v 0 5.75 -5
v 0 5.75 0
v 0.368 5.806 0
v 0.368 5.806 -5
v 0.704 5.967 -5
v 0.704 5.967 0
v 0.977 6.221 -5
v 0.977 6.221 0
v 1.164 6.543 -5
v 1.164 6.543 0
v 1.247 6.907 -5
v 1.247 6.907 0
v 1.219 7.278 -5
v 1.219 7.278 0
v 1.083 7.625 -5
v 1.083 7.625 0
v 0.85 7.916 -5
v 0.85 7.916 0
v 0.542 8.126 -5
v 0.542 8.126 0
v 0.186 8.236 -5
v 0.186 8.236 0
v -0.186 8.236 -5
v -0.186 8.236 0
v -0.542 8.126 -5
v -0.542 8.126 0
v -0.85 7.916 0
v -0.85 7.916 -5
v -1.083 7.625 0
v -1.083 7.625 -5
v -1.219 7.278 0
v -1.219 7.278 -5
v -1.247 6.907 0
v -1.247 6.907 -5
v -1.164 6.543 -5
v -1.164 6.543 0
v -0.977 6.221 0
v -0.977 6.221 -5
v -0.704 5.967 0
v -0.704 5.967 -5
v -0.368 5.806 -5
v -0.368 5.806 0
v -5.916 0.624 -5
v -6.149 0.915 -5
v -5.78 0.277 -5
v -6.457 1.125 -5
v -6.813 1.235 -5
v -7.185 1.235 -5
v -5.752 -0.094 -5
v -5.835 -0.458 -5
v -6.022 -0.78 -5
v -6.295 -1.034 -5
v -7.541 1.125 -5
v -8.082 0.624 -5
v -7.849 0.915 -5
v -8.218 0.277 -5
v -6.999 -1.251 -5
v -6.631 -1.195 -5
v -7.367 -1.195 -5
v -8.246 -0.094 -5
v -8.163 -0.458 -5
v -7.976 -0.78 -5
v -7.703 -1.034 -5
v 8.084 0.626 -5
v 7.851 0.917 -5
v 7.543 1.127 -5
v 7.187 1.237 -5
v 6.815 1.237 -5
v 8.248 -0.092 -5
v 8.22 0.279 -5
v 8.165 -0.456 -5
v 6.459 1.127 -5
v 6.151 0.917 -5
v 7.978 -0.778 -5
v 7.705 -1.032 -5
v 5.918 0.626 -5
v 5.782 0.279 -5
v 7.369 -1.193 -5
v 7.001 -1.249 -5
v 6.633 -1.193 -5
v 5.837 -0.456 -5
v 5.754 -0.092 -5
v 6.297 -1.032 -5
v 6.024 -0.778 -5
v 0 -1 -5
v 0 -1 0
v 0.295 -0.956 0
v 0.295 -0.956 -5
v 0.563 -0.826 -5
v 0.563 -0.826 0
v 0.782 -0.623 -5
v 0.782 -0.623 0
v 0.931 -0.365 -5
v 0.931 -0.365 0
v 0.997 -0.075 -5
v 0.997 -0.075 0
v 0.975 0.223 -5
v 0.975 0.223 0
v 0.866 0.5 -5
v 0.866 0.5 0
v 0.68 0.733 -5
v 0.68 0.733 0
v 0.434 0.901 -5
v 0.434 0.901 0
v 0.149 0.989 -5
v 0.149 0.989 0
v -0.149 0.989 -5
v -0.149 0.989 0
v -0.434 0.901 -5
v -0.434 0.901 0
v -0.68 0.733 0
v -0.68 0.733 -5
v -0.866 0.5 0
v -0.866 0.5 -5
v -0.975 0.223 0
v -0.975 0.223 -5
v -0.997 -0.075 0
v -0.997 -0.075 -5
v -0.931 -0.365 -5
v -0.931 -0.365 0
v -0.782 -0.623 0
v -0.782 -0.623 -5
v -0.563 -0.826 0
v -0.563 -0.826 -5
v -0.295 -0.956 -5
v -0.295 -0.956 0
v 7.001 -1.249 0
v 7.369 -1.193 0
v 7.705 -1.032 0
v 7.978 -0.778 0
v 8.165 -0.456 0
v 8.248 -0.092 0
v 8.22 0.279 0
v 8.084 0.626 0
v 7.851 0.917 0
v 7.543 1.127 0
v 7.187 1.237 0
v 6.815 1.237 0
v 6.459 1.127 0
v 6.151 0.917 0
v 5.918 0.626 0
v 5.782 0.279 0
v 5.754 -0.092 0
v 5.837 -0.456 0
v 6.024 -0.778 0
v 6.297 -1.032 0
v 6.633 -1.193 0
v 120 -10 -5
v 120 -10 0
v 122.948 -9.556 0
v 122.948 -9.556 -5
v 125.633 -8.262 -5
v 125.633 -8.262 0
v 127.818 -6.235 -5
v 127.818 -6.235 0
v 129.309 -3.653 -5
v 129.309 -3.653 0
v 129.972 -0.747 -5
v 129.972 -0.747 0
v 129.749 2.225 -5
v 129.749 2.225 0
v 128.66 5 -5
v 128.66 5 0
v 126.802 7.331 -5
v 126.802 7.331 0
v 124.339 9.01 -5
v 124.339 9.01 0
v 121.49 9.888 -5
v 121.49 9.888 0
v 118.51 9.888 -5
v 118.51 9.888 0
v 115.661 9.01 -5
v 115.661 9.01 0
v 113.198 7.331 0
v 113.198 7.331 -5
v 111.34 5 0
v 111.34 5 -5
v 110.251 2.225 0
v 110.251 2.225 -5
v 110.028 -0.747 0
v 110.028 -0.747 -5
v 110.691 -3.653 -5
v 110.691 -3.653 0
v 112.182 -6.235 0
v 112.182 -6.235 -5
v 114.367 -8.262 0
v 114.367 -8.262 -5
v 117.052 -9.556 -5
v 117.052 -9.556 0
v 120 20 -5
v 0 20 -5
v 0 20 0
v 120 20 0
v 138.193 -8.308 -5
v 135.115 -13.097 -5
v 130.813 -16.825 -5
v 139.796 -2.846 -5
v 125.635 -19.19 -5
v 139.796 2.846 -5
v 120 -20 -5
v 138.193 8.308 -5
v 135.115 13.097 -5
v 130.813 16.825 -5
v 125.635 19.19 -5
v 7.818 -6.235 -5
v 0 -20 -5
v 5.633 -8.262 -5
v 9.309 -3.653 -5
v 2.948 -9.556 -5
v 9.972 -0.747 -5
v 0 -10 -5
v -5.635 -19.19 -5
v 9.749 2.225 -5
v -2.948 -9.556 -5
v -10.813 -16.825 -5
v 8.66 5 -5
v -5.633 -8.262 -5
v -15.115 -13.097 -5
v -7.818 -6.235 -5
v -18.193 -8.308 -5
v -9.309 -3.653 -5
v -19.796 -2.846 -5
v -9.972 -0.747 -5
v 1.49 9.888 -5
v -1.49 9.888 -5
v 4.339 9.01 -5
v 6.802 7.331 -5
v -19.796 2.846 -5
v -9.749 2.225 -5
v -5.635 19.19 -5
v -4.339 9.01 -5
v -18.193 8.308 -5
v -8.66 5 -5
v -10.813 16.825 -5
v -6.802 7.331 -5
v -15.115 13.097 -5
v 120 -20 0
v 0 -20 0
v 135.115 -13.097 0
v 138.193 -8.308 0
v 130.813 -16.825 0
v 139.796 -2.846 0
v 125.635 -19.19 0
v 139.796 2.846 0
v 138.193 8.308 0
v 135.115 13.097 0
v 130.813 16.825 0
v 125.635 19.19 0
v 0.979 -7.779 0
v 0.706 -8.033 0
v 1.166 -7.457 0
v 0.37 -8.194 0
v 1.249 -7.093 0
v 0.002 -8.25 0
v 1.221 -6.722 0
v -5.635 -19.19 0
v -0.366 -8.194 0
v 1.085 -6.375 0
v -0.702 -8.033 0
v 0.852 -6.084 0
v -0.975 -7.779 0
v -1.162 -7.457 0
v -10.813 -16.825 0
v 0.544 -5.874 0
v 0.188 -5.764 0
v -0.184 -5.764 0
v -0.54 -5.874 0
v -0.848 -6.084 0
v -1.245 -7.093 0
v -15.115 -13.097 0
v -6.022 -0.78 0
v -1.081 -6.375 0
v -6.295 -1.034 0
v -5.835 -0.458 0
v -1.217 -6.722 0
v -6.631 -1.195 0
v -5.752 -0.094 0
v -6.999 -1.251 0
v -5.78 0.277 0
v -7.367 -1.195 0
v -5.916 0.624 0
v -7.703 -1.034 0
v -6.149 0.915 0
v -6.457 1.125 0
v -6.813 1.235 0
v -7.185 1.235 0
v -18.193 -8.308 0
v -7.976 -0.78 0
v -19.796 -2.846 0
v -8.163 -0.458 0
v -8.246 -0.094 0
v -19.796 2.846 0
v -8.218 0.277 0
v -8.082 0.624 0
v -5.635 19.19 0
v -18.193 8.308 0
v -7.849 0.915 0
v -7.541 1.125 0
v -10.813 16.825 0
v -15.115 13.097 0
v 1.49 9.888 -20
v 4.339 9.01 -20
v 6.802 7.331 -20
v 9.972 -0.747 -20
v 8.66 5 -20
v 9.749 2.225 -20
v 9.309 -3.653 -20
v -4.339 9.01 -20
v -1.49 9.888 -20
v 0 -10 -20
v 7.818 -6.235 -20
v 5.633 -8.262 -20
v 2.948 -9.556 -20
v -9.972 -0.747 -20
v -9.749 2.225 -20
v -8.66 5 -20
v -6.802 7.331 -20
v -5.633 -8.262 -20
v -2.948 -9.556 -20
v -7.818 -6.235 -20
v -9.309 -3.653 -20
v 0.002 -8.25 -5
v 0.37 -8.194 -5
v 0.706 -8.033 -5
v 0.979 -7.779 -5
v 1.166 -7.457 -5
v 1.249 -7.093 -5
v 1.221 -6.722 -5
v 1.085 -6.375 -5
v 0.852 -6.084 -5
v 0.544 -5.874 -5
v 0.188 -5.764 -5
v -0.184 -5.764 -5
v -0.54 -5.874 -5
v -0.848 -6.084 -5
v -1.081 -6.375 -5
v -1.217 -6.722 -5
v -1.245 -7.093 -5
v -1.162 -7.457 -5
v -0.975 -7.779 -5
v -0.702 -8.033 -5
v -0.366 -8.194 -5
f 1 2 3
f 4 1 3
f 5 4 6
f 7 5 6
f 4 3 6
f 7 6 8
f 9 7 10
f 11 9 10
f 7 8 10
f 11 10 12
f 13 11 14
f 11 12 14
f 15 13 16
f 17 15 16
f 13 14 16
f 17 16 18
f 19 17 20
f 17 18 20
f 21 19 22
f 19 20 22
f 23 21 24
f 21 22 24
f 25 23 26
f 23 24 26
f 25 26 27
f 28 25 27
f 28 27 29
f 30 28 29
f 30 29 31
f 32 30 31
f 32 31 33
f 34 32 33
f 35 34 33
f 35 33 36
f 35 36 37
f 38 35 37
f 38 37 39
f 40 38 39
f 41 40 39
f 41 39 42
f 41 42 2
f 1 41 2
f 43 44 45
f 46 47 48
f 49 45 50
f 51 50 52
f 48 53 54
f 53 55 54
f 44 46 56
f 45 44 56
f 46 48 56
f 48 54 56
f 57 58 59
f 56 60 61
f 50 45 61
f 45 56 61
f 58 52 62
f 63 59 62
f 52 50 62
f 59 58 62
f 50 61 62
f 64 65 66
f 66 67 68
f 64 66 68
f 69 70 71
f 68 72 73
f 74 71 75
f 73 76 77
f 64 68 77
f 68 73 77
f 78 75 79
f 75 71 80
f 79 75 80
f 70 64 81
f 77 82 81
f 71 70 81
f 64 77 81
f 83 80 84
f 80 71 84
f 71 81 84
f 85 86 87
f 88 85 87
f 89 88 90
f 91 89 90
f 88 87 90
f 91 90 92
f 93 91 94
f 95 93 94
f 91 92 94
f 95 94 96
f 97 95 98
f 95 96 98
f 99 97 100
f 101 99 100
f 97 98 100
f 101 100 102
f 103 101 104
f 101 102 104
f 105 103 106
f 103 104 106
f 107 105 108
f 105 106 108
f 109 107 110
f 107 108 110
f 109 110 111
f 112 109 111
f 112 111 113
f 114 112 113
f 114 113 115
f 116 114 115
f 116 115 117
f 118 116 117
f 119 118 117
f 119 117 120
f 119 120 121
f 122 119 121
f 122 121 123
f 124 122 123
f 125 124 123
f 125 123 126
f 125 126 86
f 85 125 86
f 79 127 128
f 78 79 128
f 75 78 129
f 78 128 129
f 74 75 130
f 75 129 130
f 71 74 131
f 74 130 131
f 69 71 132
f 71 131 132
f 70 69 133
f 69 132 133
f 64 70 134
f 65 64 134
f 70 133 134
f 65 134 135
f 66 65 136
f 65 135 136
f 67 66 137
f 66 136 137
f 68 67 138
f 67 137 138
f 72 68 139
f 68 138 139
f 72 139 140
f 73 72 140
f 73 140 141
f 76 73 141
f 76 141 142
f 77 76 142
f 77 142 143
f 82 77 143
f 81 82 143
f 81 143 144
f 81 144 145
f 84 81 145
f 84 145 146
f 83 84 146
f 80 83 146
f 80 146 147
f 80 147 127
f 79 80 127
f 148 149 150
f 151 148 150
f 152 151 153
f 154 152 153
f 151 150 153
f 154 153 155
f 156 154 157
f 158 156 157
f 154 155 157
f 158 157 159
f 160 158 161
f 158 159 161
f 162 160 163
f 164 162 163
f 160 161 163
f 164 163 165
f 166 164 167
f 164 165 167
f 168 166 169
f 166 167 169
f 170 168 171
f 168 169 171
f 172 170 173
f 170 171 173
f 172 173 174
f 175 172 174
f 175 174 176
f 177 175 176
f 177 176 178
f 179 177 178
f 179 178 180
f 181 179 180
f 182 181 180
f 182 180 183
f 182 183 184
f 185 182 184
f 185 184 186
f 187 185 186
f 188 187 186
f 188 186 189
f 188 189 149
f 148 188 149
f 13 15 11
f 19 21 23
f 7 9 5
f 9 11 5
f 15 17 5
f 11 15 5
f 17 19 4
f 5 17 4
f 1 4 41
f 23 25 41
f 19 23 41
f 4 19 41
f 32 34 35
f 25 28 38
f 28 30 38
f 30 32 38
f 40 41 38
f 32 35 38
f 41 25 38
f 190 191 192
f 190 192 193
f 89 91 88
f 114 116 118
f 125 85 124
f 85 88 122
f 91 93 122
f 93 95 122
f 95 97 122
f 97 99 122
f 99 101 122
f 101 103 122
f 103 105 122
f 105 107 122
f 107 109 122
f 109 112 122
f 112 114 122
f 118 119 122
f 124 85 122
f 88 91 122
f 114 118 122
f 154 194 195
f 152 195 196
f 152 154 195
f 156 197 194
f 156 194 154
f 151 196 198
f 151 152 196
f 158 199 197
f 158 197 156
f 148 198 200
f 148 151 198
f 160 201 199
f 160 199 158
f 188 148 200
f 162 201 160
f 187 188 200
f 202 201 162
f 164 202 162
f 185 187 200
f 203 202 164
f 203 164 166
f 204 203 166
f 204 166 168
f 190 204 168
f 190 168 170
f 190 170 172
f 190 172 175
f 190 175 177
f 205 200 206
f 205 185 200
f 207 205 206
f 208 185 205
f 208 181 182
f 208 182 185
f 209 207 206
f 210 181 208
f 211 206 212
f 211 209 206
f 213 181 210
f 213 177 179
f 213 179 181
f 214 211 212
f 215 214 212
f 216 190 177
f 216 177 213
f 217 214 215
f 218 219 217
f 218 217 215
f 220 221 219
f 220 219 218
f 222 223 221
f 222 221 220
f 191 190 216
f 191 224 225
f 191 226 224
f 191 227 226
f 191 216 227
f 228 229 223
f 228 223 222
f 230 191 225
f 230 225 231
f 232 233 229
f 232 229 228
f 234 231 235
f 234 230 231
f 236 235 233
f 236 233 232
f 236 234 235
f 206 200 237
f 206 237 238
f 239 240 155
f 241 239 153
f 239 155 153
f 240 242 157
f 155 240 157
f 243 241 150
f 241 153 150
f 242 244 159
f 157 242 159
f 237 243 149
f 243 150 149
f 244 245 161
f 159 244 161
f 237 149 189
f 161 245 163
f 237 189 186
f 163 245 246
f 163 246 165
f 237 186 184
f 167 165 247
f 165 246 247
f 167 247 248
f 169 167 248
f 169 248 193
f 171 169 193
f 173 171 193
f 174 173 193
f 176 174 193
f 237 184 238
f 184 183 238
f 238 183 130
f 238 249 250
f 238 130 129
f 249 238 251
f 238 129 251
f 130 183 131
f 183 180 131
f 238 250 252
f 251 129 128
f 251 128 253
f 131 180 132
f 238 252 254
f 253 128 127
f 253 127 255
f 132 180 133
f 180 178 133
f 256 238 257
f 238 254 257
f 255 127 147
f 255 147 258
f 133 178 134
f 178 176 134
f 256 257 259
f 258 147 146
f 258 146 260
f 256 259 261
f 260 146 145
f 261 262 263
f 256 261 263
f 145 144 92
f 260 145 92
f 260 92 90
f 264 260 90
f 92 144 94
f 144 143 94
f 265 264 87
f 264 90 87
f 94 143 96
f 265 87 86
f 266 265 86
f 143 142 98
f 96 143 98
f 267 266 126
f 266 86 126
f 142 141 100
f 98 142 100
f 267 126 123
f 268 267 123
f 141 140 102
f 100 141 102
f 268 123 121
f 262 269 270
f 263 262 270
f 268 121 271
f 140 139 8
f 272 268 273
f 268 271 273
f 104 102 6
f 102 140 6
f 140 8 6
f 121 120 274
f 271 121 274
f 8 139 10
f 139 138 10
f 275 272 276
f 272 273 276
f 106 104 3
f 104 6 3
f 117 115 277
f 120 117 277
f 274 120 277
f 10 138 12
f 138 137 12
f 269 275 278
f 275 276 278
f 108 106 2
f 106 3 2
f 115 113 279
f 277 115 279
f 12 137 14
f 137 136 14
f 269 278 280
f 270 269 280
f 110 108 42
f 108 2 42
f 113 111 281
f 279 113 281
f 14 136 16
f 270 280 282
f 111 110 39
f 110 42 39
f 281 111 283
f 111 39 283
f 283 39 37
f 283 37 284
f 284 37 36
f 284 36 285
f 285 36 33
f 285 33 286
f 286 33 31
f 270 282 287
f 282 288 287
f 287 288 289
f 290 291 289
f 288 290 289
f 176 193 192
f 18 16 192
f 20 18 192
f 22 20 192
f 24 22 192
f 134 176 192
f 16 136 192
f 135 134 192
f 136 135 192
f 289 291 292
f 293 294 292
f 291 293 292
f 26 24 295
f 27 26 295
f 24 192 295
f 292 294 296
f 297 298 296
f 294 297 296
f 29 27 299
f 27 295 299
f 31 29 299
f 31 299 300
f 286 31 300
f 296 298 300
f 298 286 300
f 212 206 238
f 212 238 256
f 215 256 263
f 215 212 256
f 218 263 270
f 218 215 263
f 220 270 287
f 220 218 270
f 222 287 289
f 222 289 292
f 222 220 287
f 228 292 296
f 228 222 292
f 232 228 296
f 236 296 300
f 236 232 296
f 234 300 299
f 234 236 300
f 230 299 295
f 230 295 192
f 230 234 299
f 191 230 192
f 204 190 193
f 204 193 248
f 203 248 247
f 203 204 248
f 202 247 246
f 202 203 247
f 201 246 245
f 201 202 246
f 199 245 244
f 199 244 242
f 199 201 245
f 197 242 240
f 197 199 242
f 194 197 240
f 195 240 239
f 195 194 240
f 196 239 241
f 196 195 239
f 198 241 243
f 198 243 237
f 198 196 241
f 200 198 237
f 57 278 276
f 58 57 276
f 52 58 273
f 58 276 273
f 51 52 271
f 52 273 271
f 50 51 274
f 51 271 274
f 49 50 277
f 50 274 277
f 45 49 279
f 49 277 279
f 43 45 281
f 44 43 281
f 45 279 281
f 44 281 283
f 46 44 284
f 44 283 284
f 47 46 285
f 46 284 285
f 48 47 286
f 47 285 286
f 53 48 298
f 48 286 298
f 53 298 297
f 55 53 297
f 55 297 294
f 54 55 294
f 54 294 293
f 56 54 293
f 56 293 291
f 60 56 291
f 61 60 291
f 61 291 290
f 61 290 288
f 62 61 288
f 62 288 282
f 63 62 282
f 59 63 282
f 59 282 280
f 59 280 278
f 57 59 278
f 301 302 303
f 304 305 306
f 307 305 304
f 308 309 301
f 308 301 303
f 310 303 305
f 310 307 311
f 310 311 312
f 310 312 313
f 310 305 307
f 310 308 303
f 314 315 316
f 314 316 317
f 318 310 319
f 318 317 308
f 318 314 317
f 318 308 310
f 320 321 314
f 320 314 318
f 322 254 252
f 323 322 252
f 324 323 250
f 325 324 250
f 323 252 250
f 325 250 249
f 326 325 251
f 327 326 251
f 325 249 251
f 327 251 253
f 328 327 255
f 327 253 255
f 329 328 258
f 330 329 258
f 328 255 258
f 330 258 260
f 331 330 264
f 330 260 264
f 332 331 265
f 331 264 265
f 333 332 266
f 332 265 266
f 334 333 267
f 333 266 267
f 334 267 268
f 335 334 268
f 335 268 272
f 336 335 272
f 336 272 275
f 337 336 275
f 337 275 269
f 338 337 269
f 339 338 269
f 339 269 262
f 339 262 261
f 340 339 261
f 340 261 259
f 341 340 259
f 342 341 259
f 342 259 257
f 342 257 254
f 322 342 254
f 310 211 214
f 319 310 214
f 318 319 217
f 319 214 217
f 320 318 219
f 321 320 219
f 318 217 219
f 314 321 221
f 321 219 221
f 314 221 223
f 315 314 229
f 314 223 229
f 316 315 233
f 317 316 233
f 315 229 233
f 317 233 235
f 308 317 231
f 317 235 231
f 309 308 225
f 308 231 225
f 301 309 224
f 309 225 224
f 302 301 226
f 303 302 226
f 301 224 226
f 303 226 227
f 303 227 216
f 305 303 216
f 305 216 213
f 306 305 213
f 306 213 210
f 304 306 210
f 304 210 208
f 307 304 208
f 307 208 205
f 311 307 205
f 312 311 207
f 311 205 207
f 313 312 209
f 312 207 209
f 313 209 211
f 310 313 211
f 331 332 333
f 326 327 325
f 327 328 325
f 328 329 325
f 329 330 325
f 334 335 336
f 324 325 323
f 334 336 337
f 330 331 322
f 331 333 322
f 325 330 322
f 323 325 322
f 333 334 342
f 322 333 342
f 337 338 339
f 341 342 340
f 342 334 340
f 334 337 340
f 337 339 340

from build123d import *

# Parameters (mm, degrees)
BOSS_EXTRUDE1_DEPTH   = 5
CUT_EXTRUDE1_REACH    = 143.51
SKETCH2_R             = 1
SKETCH2_R_2           = 1.25
CUT_EXTRUDE2_REACH    = 143.51
SKETCH3_R             = 10
BODY_MOVE_COPY1_ANGLE = 90
SKETCH12_R            = 10
BOSS_EXTRUDE2_DEPTH   = 15


with BuildPart() as part:
    # Sketch1 → Boss-Extrude1 (new body)
    with BuildSketch(Plane(origin=(0, 0, 0), x_dir=(1, 0, 0), z_dir=(0, 1, 0))):
        with BuildLine():
            Line((120, -20), (0, -20))
            ThreePointArc((0, -20), (-20, 0), (0, 20))
            Line((0, 20), (120, 20))
            ThreePointArc((120, 20), (140, 0), (120, -20))
        make_face()
    extrude(amount=BOSS_EXTRUDE1_DEPTH)

    # Sketch2 → Cut-Extrude1 (cut, up to next)
    with BuildSketch(Plane(origin=(0, 5, 0), x_dir=(1, 0, 0), z_dir=(0, 1, 0)), mode=Mode.PRIVATE) as cut_extrude1_sk1:
        with Locations(Location((0, 0, 0), (0, 0, 270))):
            Circle(SKETCH2_R)
    cut_extrude1_tool1 = extrude(cut_extrude1_sk1.sketch, amount=-CUT_EXTRUDE1_REACH, mode=Mode.PRIVATE) & part.part
    # Sketch2 → Cut-Extrude1 (cut, up to next)
    with BuildSketch(Plane(origin=(0, 5, 0), x_dir=(1, 0, 0), z_dir=(0, 1, 0)), mode=Mode.PRIVATE) as cut_extrude1_sk2:
        with Locations(Location((0, 7, 0), (0, 0, 270))):
            Circle(SKETCH2_R_2)
    cut_extrude1_tool2 = extrude(cut_extrude1_sk2.sketch, amount=-CUT_EXTRUDE1_REACH, mode=Mode.PRIVATE) & part.part
    # Sketch2 → Cut-Extrude1 (cut, up to next)
    with BuildSketch(Plane(origin=(0, 5, 0), x_dir=(1, 0, 0), z_dir=(0, 1, 0)), mode=Mode.PRIVATE) as cut_extrude1_sk3:
        with Locations(Location((7.001, 0.001, 0), (0, 0, 270))):
            Circle(SKETCH2_R_2)
    cut_extrude1_tool3 = extrude(cut_extrude1_sk3.sketch, amount=-CUT_EXTRUDE1_REACH, mode=Mode.PRIVATE) & part.part
    # Sketch2 → Cut-Extrude1 (cut, up to next)
    with BuildSketch(Plane(origin=(0, 5, 0), x_dir=(1, 0, 0), z_dir=(0, 1, 0)), mode=Mode.PRIVATE) as cut_extrude1_sk4:
        with Locations(Location((0.002, -7, 0), (0, 0, 270))):
            Circle(SKETCH2_R_2)
    cut_extrude1_tool4 = extrude(cut_extrude1_sk4.sketch, amount=-CUT_EXTRUDE1_REACH, mode=Mode.PRIVATE) & part.part
    # Sketch2 → Cut-Extrude1 (cut, up to next)
    with BuildSketch(Plane(origin=(0, 5, 0), x_dir=(1, 0, 0), z_dir=(0, 1, 0)), mode=Mode.PRIVATE) as cut_extrude1_sk5:
        with Locations(Location((-6.999, -0.001, 0), (0, 0, 270))):
            Circle(SKETCH2_R_2)
    cut_extrude1_tool5 = extrude(cut_extrude1_sk5.sketch, amount=-CUT_EXTRUDE1_REACH, mode=Mode.PRIVATE) & part.part
    add(cut_extrude1_tool1.solids().sort_by_distance((0, 5, 0))[0], mode=Mode.SUBTRACT)
    add(cut_extrude1_tool2.solids().sort_by_distance((0, 5, -7))[0], mode=Mode.SUBTRACT)
    add(cut_extrude1_tool3.solids().sort_by_distance((7.001, 5, -0.001))[0], mode=Mode.SUBTRACT)
    add(cut_extrude1_tool4.solids().sort_by_distance((0.002, 5, 7))[0], mode=Mode.SUBTRACT)
    add(cut_extrude1_tool5.solids().sort_by_distance((-6.999, 5, 0.001))[0], mode=Mode.SUBTRACT)

    # Sketch3 → Cut-Extrude2 (cut, up to next)
    with BuildSketch(Plane(origin=(0, 5, 0), x_dir=(1, 0, 0), z_dir=(0, 1, 0)), mode=Mode.PRIVATE) as cut_extrude2_sk1:
        with Locations(Location((120, 0, 0), (0, 0, 270))):
            Circle(SKETCH3_R)
    cut_extrude2_tool1 = extrude(cut_extrude2_sk1.sketch, amount=-CUT_EXTRUDE2_REACH, mode=Mode.PRIVATE) & part.part
    add(cut_extrude2_tool1.solids().sort_by_distance((120, 5, 0))[0], mode=Mode.SUBTRACT)


with BuildPart() as part_1:
    # Body-Move/Copy1: moved
    add(part.part.rotate(Axis((0, 0, 0), (1, 0, 0)), BODY_MOVE_COPY1_ANGLE))

    # Sketch12 → Boss-Extrude2 (add)
    with BuildSketch(Plane(origin=(0, 0, 0), x_dir=(-1, 0, 0), z_dir=(0, 0, -1))):
        with Locations(Location((0, 0, 0), (0, 0, 270))):
            Circle(SKETCH12_R)
    extrude(amount=BOSS_EXTRUDE2_DEPTH)


with BuildPart() as part_2:
    # Body-Move/Copy4: moved
    add(part_1.part.moved(Location((0, 0, -5))))


solid = part_2.part
